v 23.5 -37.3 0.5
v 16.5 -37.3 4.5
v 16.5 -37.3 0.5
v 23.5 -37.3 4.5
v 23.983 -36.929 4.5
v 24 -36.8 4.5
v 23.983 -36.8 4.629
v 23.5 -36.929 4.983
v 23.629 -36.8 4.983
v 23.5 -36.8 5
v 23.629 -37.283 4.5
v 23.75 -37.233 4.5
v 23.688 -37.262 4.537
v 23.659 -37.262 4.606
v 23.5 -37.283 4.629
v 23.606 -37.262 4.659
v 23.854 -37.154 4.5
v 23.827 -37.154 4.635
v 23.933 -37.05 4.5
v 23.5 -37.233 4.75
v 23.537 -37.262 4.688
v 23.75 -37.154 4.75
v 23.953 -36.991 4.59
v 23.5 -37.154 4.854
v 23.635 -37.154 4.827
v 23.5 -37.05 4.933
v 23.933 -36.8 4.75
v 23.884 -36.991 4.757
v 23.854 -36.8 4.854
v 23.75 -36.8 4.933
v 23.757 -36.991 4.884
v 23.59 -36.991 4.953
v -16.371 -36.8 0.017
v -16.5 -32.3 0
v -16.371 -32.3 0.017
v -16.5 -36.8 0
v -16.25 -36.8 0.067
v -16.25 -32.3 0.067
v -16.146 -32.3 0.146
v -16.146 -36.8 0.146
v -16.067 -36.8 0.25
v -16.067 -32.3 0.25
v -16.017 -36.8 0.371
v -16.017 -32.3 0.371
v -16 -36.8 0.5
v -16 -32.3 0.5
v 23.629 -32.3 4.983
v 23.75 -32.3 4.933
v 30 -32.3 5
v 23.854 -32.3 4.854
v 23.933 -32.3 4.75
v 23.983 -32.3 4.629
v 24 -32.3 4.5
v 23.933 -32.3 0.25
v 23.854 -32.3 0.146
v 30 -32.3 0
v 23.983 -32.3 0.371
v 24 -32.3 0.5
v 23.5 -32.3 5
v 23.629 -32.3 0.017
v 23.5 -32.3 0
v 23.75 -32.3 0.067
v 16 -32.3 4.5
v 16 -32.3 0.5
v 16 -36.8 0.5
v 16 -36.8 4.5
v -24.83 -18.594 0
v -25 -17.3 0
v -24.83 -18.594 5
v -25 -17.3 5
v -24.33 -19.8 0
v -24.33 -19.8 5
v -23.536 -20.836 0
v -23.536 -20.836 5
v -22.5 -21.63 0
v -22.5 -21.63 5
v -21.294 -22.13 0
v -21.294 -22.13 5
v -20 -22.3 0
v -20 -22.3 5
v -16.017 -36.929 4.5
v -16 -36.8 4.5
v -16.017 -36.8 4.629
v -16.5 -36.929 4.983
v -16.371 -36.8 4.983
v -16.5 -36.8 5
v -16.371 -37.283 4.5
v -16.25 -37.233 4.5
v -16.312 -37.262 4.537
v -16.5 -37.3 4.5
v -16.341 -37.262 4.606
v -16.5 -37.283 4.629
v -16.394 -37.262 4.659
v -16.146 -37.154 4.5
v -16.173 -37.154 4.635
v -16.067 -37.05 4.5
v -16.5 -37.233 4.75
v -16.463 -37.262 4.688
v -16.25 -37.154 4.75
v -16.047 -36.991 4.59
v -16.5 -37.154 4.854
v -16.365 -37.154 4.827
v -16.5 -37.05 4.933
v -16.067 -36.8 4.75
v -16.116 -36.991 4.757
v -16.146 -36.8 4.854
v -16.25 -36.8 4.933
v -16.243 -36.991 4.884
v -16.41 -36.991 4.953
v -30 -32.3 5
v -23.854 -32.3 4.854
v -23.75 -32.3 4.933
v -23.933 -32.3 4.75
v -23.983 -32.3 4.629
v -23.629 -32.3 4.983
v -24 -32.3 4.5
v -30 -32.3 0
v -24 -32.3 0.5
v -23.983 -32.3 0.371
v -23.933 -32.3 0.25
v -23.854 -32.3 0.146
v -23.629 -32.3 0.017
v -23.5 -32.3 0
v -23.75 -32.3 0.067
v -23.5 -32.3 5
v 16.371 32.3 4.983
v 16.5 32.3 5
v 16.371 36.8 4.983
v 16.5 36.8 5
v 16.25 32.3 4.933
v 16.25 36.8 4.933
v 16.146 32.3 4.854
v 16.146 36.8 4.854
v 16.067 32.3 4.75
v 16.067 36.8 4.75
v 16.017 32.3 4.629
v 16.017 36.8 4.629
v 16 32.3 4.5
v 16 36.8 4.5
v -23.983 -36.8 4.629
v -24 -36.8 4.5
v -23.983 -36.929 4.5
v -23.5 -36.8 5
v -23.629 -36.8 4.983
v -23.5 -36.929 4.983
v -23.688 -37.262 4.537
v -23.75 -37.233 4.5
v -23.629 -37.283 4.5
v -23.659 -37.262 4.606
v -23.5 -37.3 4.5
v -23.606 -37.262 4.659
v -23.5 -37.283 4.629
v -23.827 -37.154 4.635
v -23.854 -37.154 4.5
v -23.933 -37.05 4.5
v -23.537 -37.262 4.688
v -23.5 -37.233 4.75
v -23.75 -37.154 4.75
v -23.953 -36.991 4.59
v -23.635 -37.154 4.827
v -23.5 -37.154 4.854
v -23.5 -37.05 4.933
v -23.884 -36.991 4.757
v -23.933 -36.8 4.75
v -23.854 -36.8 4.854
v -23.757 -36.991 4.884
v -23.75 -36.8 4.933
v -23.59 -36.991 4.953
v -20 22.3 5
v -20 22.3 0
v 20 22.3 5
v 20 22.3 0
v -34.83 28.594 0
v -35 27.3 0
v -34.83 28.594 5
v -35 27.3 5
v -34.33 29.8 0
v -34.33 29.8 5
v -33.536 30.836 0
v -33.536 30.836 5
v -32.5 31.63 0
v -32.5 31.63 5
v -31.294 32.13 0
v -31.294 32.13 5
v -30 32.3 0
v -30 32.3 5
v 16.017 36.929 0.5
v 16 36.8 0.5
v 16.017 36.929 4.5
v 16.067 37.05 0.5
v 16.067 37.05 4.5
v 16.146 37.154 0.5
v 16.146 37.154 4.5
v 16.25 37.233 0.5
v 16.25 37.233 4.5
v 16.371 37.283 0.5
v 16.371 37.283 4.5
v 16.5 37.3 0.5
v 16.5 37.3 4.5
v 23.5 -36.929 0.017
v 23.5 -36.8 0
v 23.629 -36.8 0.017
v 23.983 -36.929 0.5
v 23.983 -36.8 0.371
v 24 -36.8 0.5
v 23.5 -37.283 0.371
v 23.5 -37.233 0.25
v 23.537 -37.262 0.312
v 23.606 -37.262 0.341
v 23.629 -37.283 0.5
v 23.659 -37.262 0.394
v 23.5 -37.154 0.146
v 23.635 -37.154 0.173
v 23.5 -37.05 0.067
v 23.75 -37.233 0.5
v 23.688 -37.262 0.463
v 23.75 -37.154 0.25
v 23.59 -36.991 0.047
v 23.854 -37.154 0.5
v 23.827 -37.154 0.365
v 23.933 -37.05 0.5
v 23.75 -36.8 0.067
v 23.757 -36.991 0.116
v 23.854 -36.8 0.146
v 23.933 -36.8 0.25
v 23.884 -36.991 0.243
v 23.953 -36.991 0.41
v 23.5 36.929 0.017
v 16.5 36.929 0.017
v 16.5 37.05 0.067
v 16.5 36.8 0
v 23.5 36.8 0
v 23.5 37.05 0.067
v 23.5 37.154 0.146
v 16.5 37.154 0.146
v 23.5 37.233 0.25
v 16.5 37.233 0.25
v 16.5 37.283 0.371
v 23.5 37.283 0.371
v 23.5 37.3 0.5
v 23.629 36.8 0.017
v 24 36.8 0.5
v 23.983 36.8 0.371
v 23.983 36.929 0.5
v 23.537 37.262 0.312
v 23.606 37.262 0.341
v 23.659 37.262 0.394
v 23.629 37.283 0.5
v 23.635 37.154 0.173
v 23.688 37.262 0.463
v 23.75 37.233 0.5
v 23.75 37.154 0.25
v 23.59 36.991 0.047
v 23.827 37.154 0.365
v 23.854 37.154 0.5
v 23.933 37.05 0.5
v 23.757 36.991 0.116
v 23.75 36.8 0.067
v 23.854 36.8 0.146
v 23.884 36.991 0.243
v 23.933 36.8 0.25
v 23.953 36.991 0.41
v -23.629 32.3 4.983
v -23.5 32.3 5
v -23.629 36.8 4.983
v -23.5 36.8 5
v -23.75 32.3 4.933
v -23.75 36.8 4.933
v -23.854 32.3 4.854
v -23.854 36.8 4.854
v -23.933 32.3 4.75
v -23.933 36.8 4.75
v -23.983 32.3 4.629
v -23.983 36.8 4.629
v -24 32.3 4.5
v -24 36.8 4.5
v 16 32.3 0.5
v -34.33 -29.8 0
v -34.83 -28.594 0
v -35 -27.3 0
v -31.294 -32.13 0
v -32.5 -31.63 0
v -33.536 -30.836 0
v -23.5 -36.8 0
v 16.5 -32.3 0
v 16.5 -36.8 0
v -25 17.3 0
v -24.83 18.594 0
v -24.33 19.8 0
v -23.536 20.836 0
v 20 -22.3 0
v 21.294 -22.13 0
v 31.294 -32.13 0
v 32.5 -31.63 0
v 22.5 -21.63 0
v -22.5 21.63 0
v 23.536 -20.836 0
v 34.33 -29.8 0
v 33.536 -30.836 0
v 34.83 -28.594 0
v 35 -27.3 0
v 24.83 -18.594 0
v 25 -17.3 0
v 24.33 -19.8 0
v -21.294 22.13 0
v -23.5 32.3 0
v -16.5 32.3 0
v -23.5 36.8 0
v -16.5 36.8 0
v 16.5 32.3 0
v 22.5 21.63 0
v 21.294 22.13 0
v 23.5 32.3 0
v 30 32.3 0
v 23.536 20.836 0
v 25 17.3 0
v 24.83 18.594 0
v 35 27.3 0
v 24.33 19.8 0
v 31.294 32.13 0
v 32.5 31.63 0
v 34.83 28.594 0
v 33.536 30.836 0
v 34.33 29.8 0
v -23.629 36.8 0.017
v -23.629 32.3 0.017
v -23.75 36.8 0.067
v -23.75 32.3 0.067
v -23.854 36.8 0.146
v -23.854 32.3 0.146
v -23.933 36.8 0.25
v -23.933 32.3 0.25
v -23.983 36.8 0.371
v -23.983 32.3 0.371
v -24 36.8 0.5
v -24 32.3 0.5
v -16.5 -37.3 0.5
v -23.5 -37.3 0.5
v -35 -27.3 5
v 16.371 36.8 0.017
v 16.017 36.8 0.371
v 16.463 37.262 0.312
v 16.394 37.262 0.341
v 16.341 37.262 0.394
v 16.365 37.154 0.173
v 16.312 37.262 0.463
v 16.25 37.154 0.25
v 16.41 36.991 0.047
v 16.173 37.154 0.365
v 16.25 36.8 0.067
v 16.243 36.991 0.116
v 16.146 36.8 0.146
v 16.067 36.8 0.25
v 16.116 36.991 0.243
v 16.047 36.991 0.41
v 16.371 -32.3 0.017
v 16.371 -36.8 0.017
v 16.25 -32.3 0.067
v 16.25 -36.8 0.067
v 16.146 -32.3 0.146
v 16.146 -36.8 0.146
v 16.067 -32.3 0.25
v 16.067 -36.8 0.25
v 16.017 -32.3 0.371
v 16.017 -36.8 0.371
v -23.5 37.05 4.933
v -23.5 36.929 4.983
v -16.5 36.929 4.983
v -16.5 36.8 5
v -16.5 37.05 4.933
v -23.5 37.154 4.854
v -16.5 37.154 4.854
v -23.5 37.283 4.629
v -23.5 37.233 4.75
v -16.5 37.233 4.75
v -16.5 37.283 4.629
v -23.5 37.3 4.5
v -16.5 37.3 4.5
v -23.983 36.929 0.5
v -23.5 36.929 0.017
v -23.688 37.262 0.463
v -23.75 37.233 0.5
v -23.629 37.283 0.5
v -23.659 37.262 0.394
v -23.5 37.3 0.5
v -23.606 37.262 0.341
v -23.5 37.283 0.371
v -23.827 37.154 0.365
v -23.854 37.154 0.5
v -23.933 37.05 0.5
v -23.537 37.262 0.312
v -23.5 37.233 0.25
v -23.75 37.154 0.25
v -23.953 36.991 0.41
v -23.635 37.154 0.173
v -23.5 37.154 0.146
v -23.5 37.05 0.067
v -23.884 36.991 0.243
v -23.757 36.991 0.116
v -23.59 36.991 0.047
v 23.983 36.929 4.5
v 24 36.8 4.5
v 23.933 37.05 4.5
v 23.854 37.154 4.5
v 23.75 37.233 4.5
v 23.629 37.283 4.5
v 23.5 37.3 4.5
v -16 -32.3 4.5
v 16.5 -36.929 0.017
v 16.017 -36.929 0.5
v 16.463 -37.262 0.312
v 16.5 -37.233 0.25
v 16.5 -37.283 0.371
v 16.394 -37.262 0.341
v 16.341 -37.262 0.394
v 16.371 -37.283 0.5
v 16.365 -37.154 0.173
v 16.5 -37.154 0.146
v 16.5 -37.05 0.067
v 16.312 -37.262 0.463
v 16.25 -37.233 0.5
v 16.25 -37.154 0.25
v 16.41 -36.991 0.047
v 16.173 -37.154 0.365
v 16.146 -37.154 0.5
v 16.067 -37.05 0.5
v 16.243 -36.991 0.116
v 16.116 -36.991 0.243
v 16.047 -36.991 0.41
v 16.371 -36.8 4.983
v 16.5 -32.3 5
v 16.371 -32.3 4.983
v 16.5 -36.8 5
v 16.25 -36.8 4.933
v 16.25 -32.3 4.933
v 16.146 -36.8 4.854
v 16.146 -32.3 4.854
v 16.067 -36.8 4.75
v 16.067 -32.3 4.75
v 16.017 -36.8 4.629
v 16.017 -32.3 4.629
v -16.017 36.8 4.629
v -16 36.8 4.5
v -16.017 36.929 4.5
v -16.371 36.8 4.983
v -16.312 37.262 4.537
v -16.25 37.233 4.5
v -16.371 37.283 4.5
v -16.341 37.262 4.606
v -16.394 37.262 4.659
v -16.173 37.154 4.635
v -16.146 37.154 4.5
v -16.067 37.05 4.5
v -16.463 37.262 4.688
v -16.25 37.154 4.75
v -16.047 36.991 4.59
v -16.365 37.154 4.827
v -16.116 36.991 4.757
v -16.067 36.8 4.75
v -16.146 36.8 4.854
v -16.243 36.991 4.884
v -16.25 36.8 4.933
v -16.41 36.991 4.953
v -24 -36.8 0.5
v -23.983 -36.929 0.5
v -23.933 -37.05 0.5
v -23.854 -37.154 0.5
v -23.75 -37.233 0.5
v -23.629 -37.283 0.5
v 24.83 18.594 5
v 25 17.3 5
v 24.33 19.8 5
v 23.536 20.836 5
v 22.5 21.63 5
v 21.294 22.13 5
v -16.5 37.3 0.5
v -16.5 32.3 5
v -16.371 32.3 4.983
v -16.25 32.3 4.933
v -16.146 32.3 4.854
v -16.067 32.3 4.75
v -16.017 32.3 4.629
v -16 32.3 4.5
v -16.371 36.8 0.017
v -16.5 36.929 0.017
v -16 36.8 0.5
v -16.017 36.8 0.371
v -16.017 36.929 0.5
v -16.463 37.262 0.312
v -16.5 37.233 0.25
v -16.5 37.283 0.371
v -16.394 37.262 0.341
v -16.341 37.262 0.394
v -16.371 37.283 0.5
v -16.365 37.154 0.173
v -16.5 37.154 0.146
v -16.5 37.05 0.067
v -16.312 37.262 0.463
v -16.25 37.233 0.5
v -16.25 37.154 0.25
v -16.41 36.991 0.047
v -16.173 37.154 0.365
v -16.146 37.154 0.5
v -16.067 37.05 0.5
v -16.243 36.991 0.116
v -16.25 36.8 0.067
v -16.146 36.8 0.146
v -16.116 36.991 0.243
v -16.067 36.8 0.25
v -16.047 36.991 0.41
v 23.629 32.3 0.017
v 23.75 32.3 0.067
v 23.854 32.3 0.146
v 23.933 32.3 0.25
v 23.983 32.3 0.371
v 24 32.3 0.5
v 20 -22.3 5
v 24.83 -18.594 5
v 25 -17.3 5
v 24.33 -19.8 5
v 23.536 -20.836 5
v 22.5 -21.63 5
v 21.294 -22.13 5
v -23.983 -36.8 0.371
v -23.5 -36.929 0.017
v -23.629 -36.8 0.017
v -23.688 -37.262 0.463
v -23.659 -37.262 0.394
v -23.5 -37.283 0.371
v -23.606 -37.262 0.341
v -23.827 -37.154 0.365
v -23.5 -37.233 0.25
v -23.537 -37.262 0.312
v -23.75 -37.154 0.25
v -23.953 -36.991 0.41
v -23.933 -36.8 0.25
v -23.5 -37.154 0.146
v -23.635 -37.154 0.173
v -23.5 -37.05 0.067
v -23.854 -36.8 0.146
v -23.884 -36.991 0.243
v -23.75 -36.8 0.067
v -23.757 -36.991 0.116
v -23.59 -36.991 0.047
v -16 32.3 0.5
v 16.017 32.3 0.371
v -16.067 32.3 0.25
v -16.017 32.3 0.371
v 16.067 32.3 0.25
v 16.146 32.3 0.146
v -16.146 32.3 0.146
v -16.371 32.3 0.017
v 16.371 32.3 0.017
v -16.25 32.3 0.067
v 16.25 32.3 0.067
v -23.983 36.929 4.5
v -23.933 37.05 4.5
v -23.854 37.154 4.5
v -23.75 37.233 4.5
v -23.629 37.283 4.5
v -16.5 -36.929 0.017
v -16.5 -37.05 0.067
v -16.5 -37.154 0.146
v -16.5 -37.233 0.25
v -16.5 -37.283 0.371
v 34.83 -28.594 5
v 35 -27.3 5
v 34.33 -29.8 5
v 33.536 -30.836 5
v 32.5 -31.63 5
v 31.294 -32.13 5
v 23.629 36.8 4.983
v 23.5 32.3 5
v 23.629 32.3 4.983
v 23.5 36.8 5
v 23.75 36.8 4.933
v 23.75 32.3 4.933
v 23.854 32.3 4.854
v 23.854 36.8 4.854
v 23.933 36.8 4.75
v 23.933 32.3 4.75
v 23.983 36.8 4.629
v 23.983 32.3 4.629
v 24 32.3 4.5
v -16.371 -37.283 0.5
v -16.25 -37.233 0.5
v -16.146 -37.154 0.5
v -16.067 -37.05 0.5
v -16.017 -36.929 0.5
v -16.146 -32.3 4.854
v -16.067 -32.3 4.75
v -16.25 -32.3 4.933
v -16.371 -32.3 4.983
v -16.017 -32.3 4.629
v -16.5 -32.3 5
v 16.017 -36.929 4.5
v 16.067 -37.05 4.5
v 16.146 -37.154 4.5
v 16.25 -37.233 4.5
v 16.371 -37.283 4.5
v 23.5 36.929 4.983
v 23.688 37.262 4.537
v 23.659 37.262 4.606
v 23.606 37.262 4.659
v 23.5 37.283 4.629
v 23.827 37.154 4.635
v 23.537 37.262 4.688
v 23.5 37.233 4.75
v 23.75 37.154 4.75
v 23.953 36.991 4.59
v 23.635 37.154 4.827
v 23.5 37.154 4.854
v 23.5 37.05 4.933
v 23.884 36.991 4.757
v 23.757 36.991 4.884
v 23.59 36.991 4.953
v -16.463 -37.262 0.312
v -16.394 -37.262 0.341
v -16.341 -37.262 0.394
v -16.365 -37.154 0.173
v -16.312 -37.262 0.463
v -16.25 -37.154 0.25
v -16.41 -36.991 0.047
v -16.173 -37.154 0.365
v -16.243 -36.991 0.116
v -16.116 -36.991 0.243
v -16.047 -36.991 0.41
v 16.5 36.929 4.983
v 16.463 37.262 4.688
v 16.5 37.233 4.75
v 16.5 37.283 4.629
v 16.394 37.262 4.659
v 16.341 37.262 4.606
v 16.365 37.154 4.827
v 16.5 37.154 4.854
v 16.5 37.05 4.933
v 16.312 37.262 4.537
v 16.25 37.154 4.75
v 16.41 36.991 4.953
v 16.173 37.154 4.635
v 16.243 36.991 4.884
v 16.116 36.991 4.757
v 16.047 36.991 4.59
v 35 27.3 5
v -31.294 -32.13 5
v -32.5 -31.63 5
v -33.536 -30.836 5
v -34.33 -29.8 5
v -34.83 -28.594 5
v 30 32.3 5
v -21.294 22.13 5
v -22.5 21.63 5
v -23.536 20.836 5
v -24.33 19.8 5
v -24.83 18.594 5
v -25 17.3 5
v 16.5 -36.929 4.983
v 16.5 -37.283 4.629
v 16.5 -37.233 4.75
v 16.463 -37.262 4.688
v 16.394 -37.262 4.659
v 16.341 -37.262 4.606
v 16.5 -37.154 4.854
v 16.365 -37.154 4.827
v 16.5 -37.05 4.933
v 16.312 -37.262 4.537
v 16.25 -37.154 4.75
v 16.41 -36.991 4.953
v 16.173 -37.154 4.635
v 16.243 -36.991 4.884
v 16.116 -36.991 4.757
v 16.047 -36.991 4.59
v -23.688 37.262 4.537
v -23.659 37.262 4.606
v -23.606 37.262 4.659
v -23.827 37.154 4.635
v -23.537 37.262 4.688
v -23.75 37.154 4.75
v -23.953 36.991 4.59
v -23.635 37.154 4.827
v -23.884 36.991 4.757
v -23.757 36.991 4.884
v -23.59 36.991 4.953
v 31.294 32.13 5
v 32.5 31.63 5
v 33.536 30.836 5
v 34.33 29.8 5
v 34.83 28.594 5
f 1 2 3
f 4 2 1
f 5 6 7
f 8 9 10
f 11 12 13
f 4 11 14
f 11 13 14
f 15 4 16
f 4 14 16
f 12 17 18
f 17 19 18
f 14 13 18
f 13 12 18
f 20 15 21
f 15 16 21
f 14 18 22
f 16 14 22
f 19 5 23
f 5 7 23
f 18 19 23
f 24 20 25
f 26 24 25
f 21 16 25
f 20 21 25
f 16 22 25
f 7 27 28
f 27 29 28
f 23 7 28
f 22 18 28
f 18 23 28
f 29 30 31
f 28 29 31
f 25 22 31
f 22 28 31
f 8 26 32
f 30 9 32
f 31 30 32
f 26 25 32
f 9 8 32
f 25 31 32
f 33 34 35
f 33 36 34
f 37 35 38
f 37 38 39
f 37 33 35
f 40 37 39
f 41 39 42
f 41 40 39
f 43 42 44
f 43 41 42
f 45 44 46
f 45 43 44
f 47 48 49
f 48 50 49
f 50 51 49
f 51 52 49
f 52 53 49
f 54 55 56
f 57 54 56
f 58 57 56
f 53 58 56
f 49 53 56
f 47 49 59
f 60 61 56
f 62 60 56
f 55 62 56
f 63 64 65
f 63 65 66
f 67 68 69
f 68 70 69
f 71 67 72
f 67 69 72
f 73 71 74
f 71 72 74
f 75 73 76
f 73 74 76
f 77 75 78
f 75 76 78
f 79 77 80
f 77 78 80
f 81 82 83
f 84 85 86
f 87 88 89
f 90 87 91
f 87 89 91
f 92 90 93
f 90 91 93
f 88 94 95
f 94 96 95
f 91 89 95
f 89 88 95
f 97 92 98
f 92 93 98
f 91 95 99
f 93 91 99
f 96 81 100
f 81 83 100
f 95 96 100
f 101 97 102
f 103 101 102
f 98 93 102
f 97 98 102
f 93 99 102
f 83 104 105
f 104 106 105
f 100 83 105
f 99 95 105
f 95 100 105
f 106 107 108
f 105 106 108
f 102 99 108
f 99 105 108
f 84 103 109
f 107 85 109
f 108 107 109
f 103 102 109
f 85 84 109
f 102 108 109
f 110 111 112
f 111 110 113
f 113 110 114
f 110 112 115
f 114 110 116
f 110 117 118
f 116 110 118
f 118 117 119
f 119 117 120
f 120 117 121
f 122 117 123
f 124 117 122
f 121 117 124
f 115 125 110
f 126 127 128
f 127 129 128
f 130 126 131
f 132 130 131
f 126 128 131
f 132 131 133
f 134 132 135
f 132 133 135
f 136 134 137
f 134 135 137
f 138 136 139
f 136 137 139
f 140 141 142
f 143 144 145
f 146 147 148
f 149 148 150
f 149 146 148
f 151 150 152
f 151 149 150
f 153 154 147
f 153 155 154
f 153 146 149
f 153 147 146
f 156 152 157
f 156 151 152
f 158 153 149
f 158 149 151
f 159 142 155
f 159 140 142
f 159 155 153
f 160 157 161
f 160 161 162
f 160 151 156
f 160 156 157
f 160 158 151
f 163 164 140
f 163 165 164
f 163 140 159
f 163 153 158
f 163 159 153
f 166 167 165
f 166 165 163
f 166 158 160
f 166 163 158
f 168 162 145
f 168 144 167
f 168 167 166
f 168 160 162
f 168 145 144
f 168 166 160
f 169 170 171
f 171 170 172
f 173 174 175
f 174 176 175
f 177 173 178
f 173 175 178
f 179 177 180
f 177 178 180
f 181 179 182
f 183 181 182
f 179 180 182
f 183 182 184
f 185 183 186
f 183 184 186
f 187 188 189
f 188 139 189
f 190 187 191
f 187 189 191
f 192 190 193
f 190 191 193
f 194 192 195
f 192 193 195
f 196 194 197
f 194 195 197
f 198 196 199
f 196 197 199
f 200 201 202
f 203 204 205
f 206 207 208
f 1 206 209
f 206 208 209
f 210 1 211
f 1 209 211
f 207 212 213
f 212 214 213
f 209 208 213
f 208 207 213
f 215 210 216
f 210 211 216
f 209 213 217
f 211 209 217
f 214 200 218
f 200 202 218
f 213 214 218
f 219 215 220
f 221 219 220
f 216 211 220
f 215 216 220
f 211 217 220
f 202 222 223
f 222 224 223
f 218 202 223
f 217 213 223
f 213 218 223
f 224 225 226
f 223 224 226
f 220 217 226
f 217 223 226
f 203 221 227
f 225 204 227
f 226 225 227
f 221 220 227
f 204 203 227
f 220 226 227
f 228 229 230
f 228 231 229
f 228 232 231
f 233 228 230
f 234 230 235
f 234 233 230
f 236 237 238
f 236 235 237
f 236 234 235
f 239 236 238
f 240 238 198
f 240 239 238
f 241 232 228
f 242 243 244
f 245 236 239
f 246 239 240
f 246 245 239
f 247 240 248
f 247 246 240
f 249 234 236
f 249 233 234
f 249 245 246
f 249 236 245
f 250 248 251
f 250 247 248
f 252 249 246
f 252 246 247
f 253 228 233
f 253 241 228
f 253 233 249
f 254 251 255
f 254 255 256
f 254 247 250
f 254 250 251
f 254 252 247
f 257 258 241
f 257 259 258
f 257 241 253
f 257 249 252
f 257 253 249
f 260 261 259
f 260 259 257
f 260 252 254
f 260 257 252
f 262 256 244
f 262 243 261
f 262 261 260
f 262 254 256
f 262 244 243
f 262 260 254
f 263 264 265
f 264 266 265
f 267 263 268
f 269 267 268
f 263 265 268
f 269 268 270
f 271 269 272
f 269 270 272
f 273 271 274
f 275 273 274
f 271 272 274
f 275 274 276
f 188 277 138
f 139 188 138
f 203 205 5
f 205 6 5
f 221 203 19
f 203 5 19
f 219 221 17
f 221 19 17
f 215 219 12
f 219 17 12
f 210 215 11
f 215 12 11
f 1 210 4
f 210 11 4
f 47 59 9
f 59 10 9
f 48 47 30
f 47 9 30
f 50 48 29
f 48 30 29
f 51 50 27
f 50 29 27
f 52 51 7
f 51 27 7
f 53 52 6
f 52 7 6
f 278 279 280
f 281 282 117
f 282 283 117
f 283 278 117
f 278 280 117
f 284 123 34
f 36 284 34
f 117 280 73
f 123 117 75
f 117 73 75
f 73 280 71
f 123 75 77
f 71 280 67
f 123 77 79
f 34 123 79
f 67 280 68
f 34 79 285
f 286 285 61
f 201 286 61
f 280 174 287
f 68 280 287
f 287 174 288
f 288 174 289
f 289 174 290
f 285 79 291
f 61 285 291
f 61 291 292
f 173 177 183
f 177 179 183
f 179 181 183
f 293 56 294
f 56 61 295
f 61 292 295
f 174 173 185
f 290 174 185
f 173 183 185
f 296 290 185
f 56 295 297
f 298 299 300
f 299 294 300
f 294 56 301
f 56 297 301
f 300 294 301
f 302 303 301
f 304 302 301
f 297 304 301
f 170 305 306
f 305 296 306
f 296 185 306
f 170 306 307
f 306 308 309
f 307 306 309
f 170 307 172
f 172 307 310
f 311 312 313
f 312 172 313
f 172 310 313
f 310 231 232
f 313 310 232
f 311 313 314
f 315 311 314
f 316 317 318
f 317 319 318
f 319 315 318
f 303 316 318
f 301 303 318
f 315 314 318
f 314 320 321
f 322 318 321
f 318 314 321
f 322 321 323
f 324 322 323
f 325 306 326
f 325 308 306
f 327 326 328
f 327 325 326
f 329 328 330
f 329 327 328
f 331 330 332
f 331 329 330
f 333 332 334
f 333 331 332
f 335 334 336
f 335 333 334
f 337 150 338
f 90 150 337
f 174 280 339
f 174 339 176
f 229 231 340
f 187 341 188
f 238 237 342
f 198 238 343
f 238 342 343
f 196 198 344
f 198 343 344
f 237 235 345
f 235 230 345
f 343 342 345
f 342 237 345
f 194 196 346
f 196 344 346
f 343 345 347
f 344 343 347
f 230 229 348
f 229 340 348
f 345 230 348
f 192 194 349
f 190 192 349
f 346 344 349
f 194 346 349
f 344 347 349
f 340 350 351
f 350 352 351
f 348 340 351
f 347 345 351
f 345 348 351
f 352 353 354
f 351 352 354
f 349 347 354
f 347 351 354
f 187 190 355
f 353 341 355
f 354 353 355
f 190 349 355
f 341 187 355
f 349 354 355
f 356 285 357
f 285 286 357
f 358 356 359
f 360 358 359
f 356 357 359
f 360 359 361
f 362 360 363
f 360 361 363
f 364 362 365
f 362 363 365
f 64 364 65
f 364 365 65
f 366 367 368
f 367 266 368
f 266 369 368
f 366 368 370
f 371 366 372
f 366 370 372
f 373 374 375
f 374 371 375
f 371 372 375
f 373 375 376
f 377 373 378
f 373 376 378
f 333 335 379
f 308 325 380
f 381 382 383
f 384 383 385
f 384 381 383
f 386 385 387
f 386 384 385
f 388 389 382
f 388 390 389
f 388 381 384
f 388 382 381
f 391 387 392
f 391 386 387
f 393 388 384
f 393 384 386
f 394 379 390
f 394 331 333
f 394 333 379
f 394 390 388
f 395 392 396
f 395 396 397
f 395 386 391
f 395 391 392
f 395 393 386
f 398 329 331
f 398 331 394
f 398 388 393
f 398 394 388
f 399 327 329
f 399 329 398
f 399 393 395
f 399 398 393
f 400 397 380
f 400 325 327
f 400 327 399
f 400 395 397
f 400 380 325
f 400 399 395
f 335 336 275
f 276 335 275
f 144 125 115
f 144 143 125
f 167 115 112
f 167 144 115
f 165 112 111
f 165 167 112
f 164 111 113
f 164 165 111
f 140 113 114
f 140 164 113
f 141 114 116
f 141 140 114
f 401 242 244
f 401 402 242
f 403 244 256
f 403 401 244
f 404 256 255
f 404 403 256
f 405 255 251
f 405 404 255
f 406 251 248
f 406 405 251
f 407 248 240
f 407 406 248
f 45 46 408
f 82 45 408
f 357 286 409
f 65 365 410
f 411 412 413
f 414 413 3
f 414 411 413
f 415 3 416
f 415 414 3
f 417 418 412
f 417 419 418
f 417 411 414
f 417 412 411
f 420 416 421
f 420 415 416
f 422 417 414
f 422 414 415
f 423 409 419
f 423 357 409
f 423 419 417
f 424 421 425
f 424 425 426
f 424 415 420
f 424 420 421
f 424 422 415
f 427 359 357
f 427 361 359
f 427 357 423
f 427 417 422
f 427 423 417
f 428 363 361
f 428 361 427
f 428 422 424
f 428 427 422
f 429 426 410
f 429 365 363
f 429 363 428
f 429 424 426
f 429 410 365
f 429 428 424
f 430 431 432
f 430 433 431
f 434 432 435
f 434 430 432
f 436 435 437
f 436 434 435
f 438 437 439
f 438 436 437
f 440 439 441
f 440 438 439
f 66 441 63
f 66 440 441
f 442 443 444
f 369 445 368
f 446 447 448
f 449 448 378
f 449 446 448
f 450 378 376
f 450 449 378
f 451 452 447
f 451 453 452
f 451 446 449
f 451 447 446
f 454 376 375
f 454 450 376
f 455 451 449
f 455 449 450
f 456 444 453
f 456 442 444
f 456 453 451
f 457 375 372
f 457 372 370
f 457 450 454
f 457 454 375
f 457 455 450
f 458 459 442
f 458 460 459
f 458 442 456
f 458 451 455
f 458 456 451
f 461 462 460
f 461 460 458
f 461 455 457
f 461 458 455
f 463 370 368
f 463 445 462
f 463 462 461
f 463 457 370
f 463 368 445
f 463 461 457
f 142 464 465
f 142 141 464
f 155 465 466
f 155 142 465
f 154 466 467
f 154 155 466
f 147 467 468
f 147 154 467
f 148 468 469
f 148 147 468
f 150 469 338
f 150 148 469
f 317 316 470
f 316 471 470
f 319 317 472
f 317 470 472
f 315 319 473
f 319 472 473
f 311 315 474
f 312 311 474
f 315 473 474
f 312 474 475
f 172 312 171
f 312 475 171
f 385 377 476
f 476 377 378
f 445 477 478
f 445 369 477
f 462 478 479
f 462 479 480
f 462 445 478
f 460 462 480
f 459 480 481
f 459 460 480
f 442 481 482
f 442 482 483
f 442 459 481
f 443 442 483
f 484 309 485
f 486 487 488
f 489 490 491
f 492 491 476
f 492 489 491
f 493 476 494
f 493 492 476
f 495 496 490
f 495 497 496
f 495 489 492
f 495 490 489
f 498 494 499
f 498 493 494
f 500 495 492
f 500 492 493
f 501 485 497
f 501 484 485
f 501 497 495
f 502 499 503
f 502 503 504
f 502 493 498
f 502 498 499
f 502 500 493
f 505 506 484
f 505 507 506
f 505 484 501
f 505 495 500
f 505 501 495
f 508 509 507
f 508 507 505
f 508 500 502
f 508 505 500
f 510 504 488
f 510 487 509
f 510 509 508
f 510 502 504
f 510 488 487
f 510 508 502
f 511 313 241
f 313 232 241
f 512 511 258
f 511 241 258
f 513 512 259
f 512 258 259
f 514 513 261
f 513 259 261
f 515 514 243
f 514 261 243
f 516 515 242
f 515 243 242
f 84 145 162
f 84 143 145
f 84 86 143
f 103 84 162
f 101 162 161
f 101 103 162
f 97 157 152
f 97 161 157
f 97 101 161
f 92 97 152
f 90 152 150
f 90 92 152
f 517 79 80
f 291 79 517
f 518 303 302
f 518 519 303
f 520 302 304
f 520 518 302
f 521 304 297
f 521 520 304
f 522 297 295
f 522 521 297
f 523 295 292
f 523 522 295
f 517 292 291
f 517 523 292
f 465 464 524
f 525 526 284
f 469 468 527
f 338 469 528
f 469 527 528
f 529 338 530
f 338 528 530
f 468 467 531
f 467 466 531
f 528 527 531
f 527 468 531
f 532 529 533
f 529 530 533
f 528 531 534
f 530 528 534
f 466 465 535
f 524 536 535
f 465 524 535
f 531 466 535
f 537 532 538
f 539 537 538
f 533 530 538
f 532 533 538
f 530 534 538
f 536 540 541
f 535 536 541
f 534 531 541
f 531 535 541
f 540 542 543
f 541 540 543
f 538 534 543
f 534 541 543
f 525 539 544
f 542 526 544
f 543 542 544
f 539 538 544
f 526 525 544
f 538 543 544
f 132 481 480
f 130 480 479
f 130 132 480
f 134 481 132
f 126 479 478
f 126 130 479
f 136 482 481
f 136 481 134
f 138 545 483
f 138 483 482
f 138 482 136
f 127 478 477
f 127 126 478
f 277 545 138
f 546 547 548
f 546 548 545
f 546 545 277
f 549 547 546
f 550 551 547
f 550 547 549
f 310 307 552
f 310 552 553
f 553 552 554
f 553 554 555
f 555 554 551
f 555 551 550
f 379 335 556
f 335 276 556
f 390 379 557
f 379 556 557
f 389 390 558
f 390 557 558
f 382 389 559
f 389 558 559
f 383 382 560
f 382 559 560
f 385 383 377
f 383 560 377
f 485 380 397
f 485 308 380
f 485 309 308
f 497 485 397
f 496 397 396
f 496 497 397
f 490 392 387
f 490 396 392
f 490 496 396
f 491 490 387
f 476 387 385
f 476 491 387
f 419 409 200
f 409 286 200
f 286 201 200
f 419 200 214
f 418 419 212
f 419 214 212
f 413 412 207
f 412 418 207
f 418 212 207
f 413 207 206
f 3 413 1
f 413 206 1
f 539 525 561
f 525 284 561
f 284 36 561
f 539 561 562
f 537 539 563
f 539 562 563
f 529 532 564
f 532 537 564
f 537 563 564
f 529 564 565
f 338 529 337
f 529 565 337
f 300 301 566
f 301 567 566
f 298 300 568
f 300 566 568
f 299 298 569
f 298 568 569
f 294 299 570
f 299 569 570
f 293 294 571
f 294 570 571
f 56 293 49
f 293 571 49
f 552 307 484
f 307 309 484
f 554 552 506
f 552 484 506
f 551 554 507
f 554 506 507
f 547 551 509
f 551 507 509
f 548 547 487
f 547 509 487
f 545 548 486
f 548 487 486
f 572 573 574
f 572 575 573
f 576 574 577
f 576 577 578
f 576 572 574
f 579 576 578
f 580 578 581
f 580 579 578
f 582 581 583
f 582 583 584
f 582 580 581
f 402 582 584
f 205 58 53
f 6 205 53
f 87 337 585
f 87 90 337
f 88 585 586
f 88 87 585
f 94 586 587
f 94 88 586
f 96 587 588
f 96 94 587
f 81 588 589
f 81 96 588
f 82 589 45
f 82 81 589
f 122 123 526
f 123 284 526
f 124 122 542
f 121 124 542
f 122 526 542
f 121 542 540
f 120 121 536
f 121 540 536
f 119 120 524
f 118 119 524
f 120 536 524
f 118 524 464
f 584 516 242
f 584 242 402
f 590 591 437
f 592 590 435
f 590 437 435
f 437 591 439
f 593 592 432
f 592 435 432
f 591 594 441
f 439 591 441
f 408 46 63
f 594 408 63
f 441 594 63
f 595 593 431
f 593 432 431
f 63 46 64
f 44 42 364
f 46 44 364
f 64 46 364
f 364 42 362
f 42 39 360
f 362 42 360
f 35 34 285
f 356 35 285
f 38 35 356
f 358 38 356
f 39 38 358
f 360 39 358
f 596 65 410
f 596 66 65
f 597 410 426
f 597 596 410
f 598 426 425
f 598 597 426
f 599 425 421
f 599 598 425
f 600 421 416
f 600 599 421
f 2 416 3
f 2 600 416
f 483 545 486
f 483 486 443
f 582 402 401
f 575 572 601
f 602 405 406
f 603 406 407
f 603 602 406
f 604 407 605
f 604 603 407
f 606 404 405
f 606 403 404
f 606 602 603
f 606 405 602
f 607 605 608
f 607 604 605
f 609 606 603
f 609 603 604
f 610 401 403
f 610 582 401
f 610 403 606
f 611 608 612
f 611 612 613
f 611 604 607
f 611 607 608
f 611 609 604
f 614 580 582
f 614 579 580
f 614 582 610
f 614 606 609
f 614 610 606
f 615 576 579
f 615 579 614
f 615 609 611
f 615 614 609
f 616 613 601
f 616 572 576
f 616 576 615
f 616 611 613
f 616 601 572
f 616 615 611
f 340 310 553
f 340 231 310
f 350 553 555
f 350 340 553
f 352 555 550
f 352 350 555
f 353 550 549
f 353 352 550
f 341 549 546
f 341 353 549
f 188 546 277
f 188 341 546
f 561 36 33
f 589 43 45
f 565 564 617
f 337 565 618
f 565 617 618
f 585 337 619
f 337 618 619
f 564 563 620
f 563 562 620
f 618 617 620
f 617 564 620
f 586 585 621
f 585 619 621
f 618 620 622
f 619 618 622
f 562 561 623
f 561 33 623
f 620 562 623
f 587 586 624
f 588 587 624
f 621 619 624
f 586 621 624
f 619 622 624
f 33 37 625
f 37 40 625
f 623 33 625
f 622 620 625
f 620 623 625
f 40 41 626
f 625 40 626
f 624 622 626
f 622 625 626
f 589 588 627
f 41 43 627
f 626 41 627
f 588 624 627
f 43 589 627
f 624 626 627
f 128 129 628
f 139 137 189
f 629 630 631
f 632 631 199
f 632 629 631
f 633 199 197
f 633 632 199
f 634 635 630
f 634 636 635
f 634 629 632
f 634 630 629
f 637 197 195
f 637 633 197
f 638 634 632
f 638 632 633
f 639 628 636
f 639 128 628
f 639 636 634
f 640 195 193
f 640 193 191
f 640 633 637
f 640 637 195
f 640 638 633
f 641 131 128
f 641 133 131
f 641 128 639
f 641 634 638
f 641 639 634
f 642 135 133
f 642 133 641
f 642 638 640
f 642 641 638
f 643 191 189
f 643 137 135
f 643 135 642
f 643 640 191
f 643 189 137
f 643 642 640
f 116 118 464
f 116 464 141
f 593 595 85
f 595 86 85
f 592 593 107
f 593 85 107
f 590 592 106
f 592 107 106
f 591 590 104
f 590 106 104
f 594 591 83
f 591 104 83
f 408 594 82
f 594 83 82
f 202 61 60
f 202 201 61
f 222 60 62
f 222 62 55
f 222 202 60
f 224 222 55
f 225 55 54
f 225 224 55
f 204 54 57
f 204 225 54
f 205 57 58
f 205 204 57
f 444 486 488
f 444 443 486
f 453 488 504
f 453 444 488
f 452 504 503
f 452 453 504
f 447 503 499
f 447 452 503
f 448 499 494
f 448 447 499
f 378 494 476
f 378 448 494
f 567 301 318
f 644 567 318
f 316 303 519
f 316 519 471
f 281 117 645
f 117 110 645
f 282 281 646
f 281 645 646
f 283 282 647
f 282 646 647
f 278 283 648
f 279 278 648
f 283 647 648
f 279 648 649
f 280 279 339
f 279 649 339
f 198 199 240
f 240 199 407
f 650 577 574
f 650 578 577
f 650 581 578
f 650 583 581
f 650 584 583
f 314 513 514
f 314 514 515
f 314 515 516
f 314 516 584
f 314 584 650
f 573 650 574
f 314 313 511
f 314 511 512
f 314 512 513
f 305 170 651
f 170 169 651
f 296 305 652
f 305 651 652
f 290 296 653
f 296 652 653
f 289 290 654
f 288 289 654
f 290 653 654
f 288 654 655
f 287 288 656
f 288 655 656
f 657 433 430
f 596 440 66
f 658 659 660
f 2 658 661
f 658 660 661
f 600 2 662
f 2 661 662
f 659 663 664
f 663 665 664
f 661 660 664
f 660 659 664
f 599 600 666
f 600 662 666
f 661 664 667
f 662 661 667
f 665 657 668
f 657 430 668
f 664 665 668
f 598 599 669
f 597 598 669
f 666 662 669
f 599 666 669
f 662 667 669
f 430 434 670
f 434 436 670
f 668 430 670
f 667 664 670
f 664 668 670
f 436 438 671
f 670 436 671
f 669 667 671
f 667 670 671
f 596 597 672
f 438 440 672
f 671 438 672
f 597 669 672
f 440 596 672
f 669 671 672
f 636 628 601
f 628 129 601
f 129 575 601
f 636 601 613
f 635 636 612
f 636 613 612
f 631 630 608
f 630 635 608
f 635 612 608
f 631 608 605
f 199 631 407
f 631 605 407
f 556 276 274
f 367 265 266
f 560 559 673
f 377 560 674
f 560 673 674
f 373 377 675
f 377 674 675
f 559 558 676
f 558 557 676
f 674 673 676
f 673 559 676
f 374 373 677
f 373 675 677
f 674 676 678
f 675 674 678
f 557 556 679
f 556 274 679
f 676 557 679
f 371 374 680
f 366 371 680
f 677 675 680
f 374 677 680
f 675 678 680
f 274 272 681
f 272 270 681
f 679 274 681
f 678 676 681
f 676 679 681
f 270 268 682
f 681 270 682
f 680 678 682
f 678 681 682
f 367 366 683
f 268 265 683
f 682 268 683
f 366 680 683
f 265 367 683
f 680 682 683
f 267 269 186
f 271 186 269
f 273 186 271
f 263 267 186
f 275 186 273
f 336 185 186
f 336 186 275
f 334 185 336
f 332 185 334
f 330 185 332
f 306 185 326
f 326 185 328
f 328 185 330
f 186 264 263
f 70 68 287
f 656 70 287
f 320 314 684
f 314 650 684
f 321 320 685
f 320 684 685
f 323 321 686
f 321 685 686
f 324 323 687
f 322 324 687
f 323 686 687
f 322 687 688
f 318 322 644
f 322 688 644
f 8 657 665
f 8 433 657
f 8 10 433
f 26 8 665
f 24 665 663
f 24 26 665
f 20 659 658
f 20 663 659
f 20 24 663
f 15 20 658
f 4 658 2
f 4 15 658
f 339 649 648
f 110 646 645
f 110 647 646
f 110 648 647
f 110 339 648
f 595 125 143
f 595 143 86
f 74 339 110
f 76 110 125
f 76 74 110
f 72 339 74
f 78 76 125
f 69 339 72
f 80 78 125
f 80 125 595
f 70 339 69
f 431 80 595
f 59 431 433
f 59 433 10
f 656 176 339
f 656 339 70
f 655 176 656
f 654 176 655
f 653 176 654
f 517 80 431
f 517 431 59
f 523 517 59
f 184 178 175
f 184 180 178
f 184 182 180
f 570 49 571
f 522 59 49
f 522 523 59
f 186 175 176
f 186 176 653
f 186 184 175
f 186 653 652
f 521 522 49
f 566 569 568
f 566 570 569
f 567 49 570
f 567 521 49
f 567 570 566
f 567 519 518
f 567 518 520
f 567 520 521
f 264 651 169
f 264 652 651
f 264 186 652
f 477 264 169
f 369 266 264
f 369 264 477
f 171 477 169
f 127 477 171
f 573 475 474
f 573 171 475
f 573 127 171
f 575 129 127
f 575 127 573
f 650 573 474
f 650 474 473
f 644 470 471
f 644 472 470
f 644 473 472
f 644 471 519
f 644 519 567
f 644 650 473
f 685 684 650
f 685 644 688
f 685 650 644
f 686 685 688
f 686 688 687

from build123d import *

# Parameters (mm, degrees)
CROQUIS1_W               = 70
CROQUIS1_H               = 64.6
CROQUIS1_W_2             = 50
CROQUIS1_H_2             = 44.6
SALIENTE_EXTRUIR1_DEPTH  = 5
CROQUIS2_W               = 8
CROQUIS2_H               = 5
SALIENTE_EXTRUIR2_DEPTH  = 5
REDONDEO1_R              = 0.5
REDONDEO1_OF_SIMETR_A1_R = 0.5
REDONDEO2_R              = 5


with BuildPart() as part:
    # Croquis1 → Saliente-Extruir1 (new body)
    with BuildSketch(Plane.XY):
        Rectangle(CROQUIS1_W, CROQUIS1_H)
        Rectangle(CROQUIS1_W_2, CROQUIS1_H_2, mode=Mode.SUBTRACT)
    extrude(amount=SALIENTE_EXTRUIR1_DEPTH)

    # Croquis2 → Saliente-Extruir2 (add)
    with BuildSketch(Plane.XZ.offset(32.3)):
        with Locations((-20, 2.5)):
            Rectangle(CROQUIS2_W, CROQUIS2_H)
        with Locations((20, 2.5)):
            Rectangle(CROQUIS2_W, CROQUIS2_H)
    saliente_extruir2 = extrude(amount=SALIENTE_EXTRUIR2_DEPTH)

    # Redondeo1
    redondeo1_edges = [part.edges().sort_by_distance(p)[0] for p in [
        (-24, -34.8, 5),
        (-24, -34.8, 0),
        (-16, -34.8, 0),
        (-16, -34.8, 5),
        (-24, -37.3, 2.5),
        (-20, -37.3, 0),
        (-16, -37.3, 2.5),
        (-20, -37.3, 5),
        (16, -34.8, 0),
        (24, -34.8, 0),
        (24, -34.8, 5),
        (16, -34.8, 5),
        (20, -37.3, 0),
        (24, -37.3, 2.5),
        (20, -37.3, 5),
        (16, -37.3, 2.5),
    ]]
    fillet(redondeo1_edges, radius=REDONDEO1_R)

    # Simetría1: Saliente-Extruir2 across plane
    add(saliente_extruir2.mirror(Plane.ZX))

    # Redondeo1 of Simetría1
    redondeo1_of_simetr_a1_edges = [part.edges().sort_by_distance(p)[0] for p in [
        (-24, 34.8, 5),
        (-24, 34.8, 0),
        (-16, 34.8, 0),
        (-16, 34.8, 5),
        (-24, 37.3, 2.5),
        (-20, 37.3, 0),
        (-16, 37.3, 2.5),
        (-20, 37.3, 5),
        (16, 34.8, 0),
        (24, 34.8, 0),
        (24, 34.8, 5),
        (16, 34.8, 5),
        (20, 37.3, 0),
        (24, 37.3, 2.5),
        (20, 37.3, 5),
        (16, 37.3, 2.5),
    ]]
    fillet(redondeo1_of_simetr_a1_edges, radius=REDONDEO1_OF_SIMETR_A1_R)

    # Redondeo2
    redondeo2_edges = [part.edges().sort_by_distance(p)[0] for p in [
        (-25, 22.3, 2.5),
        (-25, -22.3, 2.5),
        (25, -22.3, 2.5),
        (25, 22.3, 2.5),
        (-35, 32.3, 2.5),
        (35, 32.3, 2.5),
        (35, -32.3, 2.5),
        (-35, -32.3, 2.5),
    ]]
    fillet(redondeo2_edges, radius=REDONDEO2_R)


solid = part.part
